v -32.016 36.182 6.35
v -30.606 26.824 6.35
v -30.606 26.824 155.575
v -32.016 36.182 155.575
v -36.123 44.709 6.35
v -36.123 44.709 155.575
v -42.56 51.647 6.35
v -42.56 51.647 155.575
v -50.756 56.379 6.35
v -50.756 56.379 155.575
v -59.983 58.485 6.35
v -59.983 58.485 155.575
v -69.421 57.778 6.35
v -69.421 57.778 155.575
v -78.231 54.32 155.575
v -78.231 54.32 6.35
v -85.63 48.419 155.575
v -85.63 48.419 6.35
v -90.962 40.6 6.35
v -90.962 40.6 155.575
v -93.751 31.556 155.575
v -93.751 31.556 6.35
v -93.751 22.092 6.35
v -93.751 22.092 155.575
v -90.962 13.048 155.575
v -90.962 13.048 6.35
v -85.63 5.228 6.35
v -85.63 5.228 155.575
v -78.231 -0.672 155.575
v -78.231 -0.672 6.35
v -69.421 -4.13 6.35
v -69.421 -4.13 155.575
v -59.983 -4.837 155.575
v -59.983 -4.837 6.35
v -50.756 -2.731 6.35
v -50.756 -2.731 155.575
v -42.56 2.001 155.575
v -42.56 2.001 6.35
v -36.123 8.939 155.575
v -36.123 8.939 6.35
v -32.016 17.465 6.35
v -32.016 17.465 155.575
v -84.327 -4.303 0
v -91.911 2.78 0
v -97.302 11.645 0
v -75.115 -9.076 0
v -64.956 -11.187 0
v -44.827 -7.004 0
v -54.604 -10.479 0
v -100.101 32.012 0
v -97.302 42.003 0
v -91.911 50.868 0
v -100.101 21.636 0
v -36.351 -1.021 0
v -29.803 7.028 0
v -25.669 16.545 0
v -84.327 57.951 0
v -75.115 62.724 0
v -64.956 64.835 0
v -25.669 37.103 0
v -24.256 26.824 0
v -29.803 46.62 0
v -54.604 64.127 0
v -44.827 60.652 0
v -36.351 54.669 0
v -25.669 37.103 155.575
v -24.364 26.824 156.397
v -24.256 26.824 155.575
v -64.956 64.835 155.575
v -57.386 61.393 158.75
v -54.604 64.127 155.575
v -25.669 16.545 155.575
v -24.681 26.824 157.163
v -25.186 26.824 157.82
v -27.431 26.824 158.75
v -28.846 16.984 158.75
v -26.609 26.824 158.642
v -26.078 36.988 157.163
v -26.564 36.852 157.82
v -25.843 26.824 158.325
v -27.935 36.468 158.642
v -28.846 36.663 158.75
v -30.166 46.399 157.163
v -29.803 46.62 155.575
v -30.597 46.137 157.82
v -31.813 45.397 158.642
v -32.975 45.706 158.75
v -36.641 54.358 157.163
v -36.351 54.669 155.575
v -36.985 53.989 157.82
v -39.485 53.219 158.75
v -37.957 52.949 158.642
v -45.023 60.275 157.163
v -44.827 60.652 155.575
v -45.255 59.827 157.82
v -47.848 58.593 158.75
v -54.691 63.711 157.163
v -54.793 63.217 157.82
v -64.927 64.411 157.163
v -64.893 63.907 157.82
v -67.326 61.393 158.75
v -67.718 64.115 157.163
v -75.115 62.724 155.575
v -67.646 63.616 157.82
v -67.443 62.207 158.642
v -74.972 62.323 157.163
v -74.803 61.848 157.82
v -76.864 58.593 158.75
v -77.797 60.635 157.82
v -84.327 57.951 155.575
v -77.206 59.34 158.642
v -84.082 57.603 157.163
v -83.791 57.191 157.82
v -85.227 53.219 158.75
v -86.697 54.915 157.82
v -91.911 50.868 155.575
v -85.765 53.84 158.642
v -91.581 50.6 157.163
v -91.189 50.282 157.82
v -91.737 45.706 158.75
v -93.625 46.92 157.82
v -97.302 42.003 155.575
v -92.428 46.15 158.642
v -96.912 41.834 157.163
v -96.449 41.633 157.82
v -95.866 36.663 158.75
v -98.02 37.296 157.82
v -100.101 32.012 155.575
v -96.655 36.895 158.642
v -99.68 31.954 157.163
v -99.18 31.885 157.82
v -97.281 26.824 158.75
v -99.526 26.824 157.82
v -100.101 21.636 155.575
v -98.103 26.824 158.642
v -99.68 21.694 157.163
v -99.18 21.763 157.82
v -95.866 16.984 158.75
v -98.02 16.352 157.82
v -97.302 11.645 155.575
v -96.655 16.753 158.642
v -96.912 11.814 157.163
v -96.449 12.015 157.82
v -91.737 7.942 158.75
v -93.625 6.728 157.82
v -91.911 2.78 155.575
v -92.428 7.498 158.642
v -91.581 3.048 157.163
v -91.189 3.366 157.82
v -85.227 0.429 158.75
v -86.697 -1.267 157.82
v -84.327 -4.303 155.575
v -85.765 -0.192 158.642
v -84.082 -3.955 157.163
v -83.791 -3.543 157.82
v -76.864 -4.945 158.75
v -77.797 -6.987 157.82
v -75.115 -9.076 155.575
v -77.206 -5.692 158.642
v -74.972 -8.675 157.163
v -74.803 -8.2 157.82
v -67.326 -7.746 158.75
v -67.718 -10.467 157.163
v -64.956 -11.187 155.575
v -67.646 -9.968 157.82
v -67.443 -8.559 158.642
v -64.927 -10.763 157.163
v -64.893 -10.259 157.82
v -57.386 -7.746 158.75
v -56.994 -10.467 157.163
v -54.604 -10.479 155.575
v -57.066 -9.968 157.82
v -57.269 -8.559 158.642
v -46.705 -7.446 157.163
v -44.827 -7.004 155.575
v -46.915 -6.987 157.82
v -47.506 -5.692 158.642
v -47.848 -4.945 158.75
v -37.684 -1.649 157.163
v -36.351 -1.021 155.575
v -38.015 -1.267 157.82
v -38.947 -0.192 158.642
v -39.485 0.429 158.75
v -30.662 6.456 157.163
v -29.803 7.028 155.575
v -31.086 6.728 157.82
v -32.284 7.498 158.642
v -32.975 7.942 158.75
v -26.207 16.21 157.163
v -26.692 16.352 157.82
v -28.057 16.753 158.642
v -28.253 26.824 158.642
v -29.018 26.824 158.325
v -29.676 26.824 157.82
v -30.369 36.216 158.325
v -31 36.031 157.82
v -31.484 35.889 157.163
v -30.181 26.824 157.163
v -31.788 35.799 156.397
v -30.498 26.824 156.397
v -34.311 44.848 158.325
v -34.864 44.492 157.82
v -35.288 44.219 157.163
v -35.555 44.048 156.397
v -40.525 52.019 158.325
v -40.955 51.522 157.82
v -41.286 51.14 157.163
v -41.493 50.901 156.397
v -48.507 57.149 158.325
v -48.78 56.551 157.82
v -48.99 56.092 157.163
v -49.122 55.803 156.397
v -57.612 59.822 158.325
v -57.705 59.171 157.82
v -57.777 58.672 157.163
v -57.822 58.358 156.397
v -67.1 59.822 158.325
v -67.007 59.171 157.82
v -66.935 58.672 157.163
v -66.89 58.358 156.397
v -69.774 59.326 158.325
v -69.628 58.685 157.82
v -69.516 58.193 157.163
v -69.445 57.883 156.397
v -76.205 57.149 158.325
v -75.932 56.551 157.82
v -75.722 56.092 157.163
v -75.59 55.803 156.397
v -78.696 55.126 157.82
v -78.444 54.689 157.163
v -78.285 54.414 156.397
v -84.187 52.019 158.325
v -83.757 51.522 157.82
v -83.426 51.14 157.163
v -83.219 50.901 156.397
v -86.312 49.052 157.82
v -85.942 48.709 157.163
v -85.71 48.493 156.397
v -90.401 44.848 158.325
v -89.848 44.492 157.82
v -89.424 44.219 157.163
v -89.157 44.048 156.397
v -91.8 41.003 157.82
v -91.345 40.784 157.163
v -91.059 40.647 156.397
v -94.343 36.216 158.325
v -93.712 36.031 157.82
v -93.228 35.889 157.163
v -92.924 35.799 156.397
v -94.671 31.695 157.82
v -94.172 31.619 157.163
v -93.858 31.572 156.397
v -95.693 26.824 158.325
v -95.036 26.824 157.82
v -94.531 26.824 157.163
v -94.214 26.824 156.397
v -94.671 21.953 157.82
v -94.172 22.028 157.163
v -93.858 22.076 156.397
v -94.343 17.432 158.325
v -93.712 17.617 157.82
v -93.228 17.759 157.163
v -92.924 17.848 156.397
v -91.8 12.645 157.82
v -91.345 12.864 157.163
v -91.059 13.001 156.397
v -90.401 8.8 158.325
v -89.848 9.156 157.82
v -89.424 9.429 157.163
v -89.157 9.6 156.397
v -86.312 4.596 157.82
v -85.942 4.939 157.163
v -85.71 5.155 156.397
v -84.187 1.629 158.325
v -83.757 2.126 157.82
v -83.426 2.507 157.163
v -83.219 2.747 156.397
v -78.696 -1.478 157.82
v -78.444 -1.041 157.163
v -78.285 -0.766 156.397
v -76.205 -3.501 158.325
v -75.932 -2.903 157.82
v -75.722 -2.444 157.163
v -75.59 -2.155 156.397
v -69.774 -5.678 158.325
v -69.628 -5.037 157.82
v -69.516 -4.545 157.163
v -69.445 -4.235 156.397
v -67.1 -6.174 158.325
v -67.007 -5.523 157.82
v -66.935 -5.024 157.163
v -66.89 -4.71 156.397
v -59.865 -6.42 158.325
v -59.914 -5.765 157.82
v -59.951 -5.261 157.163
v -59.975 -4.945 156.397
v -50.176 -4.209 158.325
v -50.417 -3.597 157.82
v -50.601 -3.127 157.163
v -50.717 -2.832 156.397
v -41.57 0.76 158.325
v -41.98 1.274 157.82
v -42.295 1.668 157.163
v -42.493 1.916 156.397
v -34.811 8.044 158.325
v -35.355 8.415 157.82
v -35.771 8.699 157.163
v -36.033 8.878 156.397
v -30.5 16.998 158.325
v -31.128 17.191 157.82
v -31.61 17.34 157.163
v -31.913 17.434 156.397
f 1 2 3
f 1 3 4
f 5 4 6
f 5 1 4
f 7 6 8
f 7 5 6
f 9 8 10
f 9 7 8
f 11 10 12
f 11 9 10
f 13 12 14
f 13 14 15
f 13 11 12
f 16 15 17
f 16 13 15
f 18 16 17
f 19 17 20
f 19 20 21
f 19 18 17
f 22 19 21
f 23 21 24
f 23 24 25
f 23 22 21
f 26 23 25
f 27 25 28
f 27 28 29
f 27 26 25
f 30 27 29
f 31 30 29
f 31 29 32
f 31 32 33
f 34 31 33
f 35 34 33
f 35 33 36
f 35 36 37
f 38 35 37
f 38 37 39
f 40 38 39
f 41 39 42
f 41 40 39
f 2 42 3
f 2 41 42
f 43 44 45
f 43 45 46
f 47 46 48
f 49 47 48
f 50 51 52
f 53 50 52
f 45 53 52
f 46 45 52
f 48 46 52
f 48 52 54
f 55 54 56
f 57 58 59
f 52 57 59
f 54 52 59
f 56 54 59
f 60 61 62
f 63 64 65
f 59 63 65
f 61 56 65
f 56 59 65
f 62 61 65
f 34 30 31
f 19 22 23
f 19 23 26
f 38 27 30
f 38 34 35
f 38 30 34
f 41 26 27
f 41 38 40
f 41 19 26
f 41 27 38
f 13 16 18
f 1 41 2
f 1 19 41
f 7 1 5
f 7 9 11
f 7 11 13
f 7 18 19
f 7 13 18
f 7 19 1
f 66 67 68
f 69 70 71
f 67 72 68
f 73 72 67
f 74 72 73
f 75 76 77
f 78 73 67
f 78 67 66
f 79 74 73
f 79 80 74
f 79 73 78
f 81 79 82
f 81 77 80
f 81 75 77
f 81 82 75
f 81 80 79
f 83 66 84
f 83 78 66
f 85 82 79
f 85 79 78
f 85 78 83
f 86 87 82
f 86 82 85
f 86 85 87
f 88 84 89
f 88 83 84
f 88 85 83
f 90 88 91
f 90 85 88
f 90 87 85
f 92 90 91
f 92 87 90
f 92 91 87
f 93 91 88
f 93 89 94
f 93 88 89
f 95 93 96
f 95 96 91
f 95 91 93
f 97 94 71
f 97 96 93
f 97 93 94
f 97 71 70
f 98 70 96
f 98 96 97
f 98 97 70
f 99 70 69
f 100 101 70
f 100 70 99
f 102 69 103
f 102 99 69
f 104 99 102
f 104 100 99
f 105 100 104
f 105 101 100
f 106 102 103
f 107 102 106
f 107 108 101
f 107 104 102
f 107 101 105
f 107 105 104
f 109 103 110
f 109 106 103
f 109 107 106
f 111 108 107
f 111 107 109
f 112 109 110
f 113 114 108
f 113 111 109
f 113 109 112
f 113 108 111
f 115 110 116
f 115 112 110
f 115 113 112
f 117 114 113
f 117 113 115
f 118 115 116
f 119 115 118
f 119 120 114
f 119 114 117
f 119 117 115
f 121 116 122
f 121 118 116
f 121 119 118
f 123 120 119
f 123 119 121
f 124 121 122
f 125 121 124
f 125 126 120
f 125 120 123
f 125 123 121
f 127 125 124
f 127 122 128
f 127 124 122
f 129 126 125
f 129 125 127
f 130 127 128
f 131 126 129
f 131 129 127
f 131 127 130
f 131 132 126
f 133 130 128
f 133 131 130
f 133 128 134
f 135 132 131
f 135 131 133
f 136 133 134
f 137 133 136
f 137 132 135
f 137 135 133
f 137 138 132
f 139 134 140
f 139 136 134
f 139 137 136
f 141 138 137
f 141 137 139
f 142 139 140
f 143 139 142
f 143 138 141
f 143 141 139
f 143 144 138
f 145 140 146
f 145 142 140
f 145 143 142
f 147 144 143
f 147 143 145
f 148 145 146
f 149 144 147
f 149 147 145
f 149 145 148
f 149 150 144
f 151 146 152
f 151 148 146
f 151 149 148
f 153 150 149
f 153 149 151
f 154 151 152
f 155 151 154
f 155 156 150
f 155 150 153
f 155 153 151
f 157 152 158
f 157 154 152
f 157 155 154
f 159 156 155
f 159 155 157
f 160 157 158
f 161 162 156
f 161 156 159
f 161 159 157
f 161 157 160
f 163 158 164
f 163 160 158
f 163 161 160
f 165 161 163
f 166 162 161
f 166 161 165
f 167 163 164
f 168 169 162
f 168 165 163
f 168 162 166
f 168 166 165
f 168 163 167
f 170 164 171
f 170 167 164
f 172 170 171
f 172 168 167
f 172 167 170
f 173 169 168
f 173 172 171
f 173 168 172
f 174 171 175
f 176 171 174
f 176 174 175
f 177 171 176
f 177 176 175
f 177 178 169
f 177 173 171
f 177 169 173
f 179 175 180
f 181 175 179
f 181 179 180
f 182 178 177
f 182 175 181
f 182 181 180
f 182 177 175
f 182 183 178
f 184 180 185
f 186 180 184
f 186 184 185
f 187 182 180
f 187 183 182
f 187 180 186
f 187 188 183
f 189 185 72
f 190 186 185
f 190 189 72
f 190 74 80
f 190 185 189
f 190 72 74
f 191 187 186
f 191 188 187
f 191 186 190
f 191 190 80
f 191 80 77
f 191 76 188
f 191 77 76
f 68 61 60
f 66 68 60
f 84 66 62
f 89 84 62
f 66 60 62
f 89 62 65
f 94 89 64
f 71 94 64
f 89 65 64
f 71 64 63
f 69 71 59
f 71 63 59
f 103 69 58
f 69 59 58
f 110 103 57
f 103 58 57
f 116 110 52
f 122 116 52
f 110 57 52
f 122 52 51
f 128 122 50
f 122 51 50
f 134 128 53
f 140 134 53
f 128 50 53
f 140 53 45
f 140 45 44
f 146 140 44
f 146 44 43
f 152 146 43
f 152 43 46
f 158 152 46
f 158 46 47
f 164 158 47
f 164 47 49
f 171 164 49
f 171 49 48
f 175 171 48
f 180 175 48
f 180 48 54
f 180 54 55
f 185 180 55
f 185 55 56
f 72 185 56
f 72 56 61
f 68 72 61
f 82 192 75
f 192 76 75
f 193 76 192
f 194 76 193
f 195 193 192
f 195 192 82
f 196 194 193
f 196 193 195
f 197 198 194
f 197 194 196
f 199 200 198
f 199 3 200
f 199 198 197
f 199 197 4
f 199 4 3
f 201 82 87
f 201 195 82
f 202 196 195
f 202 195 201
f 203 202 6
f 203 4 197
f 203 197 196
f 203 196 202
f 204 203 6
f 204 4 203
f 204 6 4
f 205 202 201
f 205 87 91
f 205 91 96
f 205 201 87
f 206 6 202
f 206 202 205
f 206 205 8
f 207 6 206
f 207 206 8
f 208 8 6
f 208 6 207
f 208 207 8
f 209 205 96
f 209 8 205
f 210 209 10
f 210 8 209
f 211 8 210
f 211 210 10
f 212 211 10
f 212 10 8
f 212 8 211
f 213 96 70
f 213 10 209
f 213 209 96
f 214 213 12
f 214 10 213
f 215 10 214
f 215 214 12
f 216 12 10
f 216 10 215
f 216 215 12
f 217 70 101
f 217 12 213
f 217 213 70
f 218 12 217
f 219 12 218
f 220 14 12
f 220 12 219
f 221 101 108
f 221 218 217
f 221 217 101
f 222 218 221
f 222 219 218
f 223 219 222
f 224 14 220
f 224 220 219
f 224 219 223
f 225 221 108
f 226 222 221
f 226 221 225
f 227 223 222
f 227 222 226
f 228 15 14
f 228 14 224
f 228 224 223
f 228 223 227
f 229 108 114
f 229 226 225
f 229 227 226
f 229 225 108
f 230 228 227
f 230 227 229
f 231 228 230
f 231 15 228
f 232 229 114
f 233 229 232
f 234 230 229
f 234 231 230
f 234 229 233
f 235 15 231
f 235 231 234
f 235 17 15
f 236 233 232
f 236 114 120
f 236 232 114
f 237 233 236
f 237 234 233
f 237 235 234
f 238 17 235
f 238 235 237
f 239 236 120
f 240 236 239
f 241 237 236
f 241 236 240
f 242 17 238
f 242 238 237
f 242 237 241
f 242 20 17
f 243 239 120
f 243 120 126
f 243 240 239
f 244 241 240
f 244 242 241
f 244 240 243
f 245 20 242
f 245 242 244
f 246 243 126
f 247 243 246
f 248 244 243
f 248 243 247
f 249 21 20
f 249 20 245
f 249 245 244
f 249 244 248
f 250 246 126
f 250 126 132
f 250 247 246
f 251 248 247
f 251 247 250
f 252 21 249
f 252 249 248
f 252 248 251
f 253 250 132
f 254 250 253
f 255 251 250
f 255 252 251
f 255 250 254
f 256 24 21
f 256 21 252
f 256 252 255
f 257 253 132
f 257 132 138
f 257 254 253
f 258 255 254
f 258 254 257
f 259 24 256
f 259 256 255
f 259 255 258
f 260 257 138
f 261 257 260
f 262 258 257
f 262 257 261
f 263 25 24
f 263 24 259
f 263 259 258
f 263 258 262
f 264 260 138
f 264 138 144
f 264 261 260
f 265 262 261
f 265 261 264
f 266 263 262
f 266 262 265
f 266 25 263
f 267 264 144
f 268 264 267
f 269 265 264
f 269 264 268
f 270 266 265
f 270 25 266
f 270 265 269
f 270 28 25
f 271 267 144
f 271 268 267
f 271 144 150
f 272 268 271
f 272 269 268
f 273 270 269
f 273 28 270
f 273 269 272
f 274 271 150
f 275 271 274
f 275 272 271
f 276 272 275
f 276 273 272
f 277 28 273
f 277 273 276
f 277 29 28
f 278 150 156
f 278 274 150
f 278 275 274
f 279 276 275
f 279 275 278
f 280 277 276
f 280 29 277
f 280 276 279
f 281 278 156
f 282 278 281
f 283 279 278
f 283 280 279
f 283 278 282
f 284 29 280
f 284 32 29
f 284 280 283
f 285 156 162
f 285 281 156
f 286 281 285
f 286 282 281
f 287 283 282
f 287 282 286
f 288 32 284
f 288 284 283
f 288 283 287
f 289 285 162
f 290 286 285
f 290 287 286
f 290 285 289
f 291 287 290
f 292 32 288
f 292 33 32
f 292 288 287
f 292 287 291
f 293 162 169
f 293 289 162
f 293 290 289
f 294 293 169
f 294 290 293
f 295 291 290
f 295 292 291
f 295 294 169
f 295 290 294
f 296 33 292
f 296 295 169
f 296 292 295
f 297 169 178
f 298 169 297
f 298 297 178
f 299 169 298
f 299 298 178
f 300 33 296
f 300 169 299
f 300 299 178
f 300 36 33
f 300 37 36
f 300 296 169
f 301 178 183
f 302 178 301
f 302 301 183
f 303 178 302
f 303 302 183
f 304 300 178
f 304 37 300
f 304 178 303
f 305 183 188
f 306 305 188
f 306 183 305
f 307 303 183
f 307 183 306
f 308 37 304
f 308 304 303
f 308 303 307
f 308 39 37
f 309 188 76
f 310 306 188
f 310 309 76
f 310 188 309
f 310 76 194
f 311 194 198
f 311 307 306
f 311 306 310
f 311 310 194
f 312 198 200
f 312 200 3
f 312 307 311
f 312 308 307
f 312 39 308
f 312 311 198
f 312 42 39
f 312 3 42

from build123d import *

# Parameters (mm, degrees)
F0_R     = 38.1
F1_DEPTH = 6.35
F2_R     = 38.1
F2_R_2   = 31.75
F3_DEPTH = 152.4
F4_R     = 3.17499


# Not quite as in the source:
# - a fillet or chamfer is up to 0.001 mm smaller than in the source, because OpenCascade refuses the exact size


with BuildPart() as f1:
    # F0 (on Top) → F1 (new body)
    with BuildSketch(Plane.XY):
        with Locations((-62.3559355736, 26.823958382)):
            Circle(F0_R)
    extrude(amount=F1_DEPTH)

    # F2 (on face) → F3 (join)
    with BuildSketch(Plane.XY.offset(6.35)):
        with Locations((-62.3559355736, 26.823958382)):
            Circle(F2_R)
        with Locations((-62.3559355736, 26.823958382)):
            Circle(F2_R_2, mode=Mode.SUBTRACT)
    extrude(amount=F3_DEPTH)

    # F4 (radius 3.175 in the source; OpenCascade refuses exactly that, so slightly less here)
    f4_edges = [f1.edges().sort_by_distance(p)[0] for p in [
        (-94.105936, 26.823958, 158.75),
        (-100.455936, 26.823958, 158.75),
    ]]
    fillet(f4_edges, radius=F4_R)


solid = f1.part
